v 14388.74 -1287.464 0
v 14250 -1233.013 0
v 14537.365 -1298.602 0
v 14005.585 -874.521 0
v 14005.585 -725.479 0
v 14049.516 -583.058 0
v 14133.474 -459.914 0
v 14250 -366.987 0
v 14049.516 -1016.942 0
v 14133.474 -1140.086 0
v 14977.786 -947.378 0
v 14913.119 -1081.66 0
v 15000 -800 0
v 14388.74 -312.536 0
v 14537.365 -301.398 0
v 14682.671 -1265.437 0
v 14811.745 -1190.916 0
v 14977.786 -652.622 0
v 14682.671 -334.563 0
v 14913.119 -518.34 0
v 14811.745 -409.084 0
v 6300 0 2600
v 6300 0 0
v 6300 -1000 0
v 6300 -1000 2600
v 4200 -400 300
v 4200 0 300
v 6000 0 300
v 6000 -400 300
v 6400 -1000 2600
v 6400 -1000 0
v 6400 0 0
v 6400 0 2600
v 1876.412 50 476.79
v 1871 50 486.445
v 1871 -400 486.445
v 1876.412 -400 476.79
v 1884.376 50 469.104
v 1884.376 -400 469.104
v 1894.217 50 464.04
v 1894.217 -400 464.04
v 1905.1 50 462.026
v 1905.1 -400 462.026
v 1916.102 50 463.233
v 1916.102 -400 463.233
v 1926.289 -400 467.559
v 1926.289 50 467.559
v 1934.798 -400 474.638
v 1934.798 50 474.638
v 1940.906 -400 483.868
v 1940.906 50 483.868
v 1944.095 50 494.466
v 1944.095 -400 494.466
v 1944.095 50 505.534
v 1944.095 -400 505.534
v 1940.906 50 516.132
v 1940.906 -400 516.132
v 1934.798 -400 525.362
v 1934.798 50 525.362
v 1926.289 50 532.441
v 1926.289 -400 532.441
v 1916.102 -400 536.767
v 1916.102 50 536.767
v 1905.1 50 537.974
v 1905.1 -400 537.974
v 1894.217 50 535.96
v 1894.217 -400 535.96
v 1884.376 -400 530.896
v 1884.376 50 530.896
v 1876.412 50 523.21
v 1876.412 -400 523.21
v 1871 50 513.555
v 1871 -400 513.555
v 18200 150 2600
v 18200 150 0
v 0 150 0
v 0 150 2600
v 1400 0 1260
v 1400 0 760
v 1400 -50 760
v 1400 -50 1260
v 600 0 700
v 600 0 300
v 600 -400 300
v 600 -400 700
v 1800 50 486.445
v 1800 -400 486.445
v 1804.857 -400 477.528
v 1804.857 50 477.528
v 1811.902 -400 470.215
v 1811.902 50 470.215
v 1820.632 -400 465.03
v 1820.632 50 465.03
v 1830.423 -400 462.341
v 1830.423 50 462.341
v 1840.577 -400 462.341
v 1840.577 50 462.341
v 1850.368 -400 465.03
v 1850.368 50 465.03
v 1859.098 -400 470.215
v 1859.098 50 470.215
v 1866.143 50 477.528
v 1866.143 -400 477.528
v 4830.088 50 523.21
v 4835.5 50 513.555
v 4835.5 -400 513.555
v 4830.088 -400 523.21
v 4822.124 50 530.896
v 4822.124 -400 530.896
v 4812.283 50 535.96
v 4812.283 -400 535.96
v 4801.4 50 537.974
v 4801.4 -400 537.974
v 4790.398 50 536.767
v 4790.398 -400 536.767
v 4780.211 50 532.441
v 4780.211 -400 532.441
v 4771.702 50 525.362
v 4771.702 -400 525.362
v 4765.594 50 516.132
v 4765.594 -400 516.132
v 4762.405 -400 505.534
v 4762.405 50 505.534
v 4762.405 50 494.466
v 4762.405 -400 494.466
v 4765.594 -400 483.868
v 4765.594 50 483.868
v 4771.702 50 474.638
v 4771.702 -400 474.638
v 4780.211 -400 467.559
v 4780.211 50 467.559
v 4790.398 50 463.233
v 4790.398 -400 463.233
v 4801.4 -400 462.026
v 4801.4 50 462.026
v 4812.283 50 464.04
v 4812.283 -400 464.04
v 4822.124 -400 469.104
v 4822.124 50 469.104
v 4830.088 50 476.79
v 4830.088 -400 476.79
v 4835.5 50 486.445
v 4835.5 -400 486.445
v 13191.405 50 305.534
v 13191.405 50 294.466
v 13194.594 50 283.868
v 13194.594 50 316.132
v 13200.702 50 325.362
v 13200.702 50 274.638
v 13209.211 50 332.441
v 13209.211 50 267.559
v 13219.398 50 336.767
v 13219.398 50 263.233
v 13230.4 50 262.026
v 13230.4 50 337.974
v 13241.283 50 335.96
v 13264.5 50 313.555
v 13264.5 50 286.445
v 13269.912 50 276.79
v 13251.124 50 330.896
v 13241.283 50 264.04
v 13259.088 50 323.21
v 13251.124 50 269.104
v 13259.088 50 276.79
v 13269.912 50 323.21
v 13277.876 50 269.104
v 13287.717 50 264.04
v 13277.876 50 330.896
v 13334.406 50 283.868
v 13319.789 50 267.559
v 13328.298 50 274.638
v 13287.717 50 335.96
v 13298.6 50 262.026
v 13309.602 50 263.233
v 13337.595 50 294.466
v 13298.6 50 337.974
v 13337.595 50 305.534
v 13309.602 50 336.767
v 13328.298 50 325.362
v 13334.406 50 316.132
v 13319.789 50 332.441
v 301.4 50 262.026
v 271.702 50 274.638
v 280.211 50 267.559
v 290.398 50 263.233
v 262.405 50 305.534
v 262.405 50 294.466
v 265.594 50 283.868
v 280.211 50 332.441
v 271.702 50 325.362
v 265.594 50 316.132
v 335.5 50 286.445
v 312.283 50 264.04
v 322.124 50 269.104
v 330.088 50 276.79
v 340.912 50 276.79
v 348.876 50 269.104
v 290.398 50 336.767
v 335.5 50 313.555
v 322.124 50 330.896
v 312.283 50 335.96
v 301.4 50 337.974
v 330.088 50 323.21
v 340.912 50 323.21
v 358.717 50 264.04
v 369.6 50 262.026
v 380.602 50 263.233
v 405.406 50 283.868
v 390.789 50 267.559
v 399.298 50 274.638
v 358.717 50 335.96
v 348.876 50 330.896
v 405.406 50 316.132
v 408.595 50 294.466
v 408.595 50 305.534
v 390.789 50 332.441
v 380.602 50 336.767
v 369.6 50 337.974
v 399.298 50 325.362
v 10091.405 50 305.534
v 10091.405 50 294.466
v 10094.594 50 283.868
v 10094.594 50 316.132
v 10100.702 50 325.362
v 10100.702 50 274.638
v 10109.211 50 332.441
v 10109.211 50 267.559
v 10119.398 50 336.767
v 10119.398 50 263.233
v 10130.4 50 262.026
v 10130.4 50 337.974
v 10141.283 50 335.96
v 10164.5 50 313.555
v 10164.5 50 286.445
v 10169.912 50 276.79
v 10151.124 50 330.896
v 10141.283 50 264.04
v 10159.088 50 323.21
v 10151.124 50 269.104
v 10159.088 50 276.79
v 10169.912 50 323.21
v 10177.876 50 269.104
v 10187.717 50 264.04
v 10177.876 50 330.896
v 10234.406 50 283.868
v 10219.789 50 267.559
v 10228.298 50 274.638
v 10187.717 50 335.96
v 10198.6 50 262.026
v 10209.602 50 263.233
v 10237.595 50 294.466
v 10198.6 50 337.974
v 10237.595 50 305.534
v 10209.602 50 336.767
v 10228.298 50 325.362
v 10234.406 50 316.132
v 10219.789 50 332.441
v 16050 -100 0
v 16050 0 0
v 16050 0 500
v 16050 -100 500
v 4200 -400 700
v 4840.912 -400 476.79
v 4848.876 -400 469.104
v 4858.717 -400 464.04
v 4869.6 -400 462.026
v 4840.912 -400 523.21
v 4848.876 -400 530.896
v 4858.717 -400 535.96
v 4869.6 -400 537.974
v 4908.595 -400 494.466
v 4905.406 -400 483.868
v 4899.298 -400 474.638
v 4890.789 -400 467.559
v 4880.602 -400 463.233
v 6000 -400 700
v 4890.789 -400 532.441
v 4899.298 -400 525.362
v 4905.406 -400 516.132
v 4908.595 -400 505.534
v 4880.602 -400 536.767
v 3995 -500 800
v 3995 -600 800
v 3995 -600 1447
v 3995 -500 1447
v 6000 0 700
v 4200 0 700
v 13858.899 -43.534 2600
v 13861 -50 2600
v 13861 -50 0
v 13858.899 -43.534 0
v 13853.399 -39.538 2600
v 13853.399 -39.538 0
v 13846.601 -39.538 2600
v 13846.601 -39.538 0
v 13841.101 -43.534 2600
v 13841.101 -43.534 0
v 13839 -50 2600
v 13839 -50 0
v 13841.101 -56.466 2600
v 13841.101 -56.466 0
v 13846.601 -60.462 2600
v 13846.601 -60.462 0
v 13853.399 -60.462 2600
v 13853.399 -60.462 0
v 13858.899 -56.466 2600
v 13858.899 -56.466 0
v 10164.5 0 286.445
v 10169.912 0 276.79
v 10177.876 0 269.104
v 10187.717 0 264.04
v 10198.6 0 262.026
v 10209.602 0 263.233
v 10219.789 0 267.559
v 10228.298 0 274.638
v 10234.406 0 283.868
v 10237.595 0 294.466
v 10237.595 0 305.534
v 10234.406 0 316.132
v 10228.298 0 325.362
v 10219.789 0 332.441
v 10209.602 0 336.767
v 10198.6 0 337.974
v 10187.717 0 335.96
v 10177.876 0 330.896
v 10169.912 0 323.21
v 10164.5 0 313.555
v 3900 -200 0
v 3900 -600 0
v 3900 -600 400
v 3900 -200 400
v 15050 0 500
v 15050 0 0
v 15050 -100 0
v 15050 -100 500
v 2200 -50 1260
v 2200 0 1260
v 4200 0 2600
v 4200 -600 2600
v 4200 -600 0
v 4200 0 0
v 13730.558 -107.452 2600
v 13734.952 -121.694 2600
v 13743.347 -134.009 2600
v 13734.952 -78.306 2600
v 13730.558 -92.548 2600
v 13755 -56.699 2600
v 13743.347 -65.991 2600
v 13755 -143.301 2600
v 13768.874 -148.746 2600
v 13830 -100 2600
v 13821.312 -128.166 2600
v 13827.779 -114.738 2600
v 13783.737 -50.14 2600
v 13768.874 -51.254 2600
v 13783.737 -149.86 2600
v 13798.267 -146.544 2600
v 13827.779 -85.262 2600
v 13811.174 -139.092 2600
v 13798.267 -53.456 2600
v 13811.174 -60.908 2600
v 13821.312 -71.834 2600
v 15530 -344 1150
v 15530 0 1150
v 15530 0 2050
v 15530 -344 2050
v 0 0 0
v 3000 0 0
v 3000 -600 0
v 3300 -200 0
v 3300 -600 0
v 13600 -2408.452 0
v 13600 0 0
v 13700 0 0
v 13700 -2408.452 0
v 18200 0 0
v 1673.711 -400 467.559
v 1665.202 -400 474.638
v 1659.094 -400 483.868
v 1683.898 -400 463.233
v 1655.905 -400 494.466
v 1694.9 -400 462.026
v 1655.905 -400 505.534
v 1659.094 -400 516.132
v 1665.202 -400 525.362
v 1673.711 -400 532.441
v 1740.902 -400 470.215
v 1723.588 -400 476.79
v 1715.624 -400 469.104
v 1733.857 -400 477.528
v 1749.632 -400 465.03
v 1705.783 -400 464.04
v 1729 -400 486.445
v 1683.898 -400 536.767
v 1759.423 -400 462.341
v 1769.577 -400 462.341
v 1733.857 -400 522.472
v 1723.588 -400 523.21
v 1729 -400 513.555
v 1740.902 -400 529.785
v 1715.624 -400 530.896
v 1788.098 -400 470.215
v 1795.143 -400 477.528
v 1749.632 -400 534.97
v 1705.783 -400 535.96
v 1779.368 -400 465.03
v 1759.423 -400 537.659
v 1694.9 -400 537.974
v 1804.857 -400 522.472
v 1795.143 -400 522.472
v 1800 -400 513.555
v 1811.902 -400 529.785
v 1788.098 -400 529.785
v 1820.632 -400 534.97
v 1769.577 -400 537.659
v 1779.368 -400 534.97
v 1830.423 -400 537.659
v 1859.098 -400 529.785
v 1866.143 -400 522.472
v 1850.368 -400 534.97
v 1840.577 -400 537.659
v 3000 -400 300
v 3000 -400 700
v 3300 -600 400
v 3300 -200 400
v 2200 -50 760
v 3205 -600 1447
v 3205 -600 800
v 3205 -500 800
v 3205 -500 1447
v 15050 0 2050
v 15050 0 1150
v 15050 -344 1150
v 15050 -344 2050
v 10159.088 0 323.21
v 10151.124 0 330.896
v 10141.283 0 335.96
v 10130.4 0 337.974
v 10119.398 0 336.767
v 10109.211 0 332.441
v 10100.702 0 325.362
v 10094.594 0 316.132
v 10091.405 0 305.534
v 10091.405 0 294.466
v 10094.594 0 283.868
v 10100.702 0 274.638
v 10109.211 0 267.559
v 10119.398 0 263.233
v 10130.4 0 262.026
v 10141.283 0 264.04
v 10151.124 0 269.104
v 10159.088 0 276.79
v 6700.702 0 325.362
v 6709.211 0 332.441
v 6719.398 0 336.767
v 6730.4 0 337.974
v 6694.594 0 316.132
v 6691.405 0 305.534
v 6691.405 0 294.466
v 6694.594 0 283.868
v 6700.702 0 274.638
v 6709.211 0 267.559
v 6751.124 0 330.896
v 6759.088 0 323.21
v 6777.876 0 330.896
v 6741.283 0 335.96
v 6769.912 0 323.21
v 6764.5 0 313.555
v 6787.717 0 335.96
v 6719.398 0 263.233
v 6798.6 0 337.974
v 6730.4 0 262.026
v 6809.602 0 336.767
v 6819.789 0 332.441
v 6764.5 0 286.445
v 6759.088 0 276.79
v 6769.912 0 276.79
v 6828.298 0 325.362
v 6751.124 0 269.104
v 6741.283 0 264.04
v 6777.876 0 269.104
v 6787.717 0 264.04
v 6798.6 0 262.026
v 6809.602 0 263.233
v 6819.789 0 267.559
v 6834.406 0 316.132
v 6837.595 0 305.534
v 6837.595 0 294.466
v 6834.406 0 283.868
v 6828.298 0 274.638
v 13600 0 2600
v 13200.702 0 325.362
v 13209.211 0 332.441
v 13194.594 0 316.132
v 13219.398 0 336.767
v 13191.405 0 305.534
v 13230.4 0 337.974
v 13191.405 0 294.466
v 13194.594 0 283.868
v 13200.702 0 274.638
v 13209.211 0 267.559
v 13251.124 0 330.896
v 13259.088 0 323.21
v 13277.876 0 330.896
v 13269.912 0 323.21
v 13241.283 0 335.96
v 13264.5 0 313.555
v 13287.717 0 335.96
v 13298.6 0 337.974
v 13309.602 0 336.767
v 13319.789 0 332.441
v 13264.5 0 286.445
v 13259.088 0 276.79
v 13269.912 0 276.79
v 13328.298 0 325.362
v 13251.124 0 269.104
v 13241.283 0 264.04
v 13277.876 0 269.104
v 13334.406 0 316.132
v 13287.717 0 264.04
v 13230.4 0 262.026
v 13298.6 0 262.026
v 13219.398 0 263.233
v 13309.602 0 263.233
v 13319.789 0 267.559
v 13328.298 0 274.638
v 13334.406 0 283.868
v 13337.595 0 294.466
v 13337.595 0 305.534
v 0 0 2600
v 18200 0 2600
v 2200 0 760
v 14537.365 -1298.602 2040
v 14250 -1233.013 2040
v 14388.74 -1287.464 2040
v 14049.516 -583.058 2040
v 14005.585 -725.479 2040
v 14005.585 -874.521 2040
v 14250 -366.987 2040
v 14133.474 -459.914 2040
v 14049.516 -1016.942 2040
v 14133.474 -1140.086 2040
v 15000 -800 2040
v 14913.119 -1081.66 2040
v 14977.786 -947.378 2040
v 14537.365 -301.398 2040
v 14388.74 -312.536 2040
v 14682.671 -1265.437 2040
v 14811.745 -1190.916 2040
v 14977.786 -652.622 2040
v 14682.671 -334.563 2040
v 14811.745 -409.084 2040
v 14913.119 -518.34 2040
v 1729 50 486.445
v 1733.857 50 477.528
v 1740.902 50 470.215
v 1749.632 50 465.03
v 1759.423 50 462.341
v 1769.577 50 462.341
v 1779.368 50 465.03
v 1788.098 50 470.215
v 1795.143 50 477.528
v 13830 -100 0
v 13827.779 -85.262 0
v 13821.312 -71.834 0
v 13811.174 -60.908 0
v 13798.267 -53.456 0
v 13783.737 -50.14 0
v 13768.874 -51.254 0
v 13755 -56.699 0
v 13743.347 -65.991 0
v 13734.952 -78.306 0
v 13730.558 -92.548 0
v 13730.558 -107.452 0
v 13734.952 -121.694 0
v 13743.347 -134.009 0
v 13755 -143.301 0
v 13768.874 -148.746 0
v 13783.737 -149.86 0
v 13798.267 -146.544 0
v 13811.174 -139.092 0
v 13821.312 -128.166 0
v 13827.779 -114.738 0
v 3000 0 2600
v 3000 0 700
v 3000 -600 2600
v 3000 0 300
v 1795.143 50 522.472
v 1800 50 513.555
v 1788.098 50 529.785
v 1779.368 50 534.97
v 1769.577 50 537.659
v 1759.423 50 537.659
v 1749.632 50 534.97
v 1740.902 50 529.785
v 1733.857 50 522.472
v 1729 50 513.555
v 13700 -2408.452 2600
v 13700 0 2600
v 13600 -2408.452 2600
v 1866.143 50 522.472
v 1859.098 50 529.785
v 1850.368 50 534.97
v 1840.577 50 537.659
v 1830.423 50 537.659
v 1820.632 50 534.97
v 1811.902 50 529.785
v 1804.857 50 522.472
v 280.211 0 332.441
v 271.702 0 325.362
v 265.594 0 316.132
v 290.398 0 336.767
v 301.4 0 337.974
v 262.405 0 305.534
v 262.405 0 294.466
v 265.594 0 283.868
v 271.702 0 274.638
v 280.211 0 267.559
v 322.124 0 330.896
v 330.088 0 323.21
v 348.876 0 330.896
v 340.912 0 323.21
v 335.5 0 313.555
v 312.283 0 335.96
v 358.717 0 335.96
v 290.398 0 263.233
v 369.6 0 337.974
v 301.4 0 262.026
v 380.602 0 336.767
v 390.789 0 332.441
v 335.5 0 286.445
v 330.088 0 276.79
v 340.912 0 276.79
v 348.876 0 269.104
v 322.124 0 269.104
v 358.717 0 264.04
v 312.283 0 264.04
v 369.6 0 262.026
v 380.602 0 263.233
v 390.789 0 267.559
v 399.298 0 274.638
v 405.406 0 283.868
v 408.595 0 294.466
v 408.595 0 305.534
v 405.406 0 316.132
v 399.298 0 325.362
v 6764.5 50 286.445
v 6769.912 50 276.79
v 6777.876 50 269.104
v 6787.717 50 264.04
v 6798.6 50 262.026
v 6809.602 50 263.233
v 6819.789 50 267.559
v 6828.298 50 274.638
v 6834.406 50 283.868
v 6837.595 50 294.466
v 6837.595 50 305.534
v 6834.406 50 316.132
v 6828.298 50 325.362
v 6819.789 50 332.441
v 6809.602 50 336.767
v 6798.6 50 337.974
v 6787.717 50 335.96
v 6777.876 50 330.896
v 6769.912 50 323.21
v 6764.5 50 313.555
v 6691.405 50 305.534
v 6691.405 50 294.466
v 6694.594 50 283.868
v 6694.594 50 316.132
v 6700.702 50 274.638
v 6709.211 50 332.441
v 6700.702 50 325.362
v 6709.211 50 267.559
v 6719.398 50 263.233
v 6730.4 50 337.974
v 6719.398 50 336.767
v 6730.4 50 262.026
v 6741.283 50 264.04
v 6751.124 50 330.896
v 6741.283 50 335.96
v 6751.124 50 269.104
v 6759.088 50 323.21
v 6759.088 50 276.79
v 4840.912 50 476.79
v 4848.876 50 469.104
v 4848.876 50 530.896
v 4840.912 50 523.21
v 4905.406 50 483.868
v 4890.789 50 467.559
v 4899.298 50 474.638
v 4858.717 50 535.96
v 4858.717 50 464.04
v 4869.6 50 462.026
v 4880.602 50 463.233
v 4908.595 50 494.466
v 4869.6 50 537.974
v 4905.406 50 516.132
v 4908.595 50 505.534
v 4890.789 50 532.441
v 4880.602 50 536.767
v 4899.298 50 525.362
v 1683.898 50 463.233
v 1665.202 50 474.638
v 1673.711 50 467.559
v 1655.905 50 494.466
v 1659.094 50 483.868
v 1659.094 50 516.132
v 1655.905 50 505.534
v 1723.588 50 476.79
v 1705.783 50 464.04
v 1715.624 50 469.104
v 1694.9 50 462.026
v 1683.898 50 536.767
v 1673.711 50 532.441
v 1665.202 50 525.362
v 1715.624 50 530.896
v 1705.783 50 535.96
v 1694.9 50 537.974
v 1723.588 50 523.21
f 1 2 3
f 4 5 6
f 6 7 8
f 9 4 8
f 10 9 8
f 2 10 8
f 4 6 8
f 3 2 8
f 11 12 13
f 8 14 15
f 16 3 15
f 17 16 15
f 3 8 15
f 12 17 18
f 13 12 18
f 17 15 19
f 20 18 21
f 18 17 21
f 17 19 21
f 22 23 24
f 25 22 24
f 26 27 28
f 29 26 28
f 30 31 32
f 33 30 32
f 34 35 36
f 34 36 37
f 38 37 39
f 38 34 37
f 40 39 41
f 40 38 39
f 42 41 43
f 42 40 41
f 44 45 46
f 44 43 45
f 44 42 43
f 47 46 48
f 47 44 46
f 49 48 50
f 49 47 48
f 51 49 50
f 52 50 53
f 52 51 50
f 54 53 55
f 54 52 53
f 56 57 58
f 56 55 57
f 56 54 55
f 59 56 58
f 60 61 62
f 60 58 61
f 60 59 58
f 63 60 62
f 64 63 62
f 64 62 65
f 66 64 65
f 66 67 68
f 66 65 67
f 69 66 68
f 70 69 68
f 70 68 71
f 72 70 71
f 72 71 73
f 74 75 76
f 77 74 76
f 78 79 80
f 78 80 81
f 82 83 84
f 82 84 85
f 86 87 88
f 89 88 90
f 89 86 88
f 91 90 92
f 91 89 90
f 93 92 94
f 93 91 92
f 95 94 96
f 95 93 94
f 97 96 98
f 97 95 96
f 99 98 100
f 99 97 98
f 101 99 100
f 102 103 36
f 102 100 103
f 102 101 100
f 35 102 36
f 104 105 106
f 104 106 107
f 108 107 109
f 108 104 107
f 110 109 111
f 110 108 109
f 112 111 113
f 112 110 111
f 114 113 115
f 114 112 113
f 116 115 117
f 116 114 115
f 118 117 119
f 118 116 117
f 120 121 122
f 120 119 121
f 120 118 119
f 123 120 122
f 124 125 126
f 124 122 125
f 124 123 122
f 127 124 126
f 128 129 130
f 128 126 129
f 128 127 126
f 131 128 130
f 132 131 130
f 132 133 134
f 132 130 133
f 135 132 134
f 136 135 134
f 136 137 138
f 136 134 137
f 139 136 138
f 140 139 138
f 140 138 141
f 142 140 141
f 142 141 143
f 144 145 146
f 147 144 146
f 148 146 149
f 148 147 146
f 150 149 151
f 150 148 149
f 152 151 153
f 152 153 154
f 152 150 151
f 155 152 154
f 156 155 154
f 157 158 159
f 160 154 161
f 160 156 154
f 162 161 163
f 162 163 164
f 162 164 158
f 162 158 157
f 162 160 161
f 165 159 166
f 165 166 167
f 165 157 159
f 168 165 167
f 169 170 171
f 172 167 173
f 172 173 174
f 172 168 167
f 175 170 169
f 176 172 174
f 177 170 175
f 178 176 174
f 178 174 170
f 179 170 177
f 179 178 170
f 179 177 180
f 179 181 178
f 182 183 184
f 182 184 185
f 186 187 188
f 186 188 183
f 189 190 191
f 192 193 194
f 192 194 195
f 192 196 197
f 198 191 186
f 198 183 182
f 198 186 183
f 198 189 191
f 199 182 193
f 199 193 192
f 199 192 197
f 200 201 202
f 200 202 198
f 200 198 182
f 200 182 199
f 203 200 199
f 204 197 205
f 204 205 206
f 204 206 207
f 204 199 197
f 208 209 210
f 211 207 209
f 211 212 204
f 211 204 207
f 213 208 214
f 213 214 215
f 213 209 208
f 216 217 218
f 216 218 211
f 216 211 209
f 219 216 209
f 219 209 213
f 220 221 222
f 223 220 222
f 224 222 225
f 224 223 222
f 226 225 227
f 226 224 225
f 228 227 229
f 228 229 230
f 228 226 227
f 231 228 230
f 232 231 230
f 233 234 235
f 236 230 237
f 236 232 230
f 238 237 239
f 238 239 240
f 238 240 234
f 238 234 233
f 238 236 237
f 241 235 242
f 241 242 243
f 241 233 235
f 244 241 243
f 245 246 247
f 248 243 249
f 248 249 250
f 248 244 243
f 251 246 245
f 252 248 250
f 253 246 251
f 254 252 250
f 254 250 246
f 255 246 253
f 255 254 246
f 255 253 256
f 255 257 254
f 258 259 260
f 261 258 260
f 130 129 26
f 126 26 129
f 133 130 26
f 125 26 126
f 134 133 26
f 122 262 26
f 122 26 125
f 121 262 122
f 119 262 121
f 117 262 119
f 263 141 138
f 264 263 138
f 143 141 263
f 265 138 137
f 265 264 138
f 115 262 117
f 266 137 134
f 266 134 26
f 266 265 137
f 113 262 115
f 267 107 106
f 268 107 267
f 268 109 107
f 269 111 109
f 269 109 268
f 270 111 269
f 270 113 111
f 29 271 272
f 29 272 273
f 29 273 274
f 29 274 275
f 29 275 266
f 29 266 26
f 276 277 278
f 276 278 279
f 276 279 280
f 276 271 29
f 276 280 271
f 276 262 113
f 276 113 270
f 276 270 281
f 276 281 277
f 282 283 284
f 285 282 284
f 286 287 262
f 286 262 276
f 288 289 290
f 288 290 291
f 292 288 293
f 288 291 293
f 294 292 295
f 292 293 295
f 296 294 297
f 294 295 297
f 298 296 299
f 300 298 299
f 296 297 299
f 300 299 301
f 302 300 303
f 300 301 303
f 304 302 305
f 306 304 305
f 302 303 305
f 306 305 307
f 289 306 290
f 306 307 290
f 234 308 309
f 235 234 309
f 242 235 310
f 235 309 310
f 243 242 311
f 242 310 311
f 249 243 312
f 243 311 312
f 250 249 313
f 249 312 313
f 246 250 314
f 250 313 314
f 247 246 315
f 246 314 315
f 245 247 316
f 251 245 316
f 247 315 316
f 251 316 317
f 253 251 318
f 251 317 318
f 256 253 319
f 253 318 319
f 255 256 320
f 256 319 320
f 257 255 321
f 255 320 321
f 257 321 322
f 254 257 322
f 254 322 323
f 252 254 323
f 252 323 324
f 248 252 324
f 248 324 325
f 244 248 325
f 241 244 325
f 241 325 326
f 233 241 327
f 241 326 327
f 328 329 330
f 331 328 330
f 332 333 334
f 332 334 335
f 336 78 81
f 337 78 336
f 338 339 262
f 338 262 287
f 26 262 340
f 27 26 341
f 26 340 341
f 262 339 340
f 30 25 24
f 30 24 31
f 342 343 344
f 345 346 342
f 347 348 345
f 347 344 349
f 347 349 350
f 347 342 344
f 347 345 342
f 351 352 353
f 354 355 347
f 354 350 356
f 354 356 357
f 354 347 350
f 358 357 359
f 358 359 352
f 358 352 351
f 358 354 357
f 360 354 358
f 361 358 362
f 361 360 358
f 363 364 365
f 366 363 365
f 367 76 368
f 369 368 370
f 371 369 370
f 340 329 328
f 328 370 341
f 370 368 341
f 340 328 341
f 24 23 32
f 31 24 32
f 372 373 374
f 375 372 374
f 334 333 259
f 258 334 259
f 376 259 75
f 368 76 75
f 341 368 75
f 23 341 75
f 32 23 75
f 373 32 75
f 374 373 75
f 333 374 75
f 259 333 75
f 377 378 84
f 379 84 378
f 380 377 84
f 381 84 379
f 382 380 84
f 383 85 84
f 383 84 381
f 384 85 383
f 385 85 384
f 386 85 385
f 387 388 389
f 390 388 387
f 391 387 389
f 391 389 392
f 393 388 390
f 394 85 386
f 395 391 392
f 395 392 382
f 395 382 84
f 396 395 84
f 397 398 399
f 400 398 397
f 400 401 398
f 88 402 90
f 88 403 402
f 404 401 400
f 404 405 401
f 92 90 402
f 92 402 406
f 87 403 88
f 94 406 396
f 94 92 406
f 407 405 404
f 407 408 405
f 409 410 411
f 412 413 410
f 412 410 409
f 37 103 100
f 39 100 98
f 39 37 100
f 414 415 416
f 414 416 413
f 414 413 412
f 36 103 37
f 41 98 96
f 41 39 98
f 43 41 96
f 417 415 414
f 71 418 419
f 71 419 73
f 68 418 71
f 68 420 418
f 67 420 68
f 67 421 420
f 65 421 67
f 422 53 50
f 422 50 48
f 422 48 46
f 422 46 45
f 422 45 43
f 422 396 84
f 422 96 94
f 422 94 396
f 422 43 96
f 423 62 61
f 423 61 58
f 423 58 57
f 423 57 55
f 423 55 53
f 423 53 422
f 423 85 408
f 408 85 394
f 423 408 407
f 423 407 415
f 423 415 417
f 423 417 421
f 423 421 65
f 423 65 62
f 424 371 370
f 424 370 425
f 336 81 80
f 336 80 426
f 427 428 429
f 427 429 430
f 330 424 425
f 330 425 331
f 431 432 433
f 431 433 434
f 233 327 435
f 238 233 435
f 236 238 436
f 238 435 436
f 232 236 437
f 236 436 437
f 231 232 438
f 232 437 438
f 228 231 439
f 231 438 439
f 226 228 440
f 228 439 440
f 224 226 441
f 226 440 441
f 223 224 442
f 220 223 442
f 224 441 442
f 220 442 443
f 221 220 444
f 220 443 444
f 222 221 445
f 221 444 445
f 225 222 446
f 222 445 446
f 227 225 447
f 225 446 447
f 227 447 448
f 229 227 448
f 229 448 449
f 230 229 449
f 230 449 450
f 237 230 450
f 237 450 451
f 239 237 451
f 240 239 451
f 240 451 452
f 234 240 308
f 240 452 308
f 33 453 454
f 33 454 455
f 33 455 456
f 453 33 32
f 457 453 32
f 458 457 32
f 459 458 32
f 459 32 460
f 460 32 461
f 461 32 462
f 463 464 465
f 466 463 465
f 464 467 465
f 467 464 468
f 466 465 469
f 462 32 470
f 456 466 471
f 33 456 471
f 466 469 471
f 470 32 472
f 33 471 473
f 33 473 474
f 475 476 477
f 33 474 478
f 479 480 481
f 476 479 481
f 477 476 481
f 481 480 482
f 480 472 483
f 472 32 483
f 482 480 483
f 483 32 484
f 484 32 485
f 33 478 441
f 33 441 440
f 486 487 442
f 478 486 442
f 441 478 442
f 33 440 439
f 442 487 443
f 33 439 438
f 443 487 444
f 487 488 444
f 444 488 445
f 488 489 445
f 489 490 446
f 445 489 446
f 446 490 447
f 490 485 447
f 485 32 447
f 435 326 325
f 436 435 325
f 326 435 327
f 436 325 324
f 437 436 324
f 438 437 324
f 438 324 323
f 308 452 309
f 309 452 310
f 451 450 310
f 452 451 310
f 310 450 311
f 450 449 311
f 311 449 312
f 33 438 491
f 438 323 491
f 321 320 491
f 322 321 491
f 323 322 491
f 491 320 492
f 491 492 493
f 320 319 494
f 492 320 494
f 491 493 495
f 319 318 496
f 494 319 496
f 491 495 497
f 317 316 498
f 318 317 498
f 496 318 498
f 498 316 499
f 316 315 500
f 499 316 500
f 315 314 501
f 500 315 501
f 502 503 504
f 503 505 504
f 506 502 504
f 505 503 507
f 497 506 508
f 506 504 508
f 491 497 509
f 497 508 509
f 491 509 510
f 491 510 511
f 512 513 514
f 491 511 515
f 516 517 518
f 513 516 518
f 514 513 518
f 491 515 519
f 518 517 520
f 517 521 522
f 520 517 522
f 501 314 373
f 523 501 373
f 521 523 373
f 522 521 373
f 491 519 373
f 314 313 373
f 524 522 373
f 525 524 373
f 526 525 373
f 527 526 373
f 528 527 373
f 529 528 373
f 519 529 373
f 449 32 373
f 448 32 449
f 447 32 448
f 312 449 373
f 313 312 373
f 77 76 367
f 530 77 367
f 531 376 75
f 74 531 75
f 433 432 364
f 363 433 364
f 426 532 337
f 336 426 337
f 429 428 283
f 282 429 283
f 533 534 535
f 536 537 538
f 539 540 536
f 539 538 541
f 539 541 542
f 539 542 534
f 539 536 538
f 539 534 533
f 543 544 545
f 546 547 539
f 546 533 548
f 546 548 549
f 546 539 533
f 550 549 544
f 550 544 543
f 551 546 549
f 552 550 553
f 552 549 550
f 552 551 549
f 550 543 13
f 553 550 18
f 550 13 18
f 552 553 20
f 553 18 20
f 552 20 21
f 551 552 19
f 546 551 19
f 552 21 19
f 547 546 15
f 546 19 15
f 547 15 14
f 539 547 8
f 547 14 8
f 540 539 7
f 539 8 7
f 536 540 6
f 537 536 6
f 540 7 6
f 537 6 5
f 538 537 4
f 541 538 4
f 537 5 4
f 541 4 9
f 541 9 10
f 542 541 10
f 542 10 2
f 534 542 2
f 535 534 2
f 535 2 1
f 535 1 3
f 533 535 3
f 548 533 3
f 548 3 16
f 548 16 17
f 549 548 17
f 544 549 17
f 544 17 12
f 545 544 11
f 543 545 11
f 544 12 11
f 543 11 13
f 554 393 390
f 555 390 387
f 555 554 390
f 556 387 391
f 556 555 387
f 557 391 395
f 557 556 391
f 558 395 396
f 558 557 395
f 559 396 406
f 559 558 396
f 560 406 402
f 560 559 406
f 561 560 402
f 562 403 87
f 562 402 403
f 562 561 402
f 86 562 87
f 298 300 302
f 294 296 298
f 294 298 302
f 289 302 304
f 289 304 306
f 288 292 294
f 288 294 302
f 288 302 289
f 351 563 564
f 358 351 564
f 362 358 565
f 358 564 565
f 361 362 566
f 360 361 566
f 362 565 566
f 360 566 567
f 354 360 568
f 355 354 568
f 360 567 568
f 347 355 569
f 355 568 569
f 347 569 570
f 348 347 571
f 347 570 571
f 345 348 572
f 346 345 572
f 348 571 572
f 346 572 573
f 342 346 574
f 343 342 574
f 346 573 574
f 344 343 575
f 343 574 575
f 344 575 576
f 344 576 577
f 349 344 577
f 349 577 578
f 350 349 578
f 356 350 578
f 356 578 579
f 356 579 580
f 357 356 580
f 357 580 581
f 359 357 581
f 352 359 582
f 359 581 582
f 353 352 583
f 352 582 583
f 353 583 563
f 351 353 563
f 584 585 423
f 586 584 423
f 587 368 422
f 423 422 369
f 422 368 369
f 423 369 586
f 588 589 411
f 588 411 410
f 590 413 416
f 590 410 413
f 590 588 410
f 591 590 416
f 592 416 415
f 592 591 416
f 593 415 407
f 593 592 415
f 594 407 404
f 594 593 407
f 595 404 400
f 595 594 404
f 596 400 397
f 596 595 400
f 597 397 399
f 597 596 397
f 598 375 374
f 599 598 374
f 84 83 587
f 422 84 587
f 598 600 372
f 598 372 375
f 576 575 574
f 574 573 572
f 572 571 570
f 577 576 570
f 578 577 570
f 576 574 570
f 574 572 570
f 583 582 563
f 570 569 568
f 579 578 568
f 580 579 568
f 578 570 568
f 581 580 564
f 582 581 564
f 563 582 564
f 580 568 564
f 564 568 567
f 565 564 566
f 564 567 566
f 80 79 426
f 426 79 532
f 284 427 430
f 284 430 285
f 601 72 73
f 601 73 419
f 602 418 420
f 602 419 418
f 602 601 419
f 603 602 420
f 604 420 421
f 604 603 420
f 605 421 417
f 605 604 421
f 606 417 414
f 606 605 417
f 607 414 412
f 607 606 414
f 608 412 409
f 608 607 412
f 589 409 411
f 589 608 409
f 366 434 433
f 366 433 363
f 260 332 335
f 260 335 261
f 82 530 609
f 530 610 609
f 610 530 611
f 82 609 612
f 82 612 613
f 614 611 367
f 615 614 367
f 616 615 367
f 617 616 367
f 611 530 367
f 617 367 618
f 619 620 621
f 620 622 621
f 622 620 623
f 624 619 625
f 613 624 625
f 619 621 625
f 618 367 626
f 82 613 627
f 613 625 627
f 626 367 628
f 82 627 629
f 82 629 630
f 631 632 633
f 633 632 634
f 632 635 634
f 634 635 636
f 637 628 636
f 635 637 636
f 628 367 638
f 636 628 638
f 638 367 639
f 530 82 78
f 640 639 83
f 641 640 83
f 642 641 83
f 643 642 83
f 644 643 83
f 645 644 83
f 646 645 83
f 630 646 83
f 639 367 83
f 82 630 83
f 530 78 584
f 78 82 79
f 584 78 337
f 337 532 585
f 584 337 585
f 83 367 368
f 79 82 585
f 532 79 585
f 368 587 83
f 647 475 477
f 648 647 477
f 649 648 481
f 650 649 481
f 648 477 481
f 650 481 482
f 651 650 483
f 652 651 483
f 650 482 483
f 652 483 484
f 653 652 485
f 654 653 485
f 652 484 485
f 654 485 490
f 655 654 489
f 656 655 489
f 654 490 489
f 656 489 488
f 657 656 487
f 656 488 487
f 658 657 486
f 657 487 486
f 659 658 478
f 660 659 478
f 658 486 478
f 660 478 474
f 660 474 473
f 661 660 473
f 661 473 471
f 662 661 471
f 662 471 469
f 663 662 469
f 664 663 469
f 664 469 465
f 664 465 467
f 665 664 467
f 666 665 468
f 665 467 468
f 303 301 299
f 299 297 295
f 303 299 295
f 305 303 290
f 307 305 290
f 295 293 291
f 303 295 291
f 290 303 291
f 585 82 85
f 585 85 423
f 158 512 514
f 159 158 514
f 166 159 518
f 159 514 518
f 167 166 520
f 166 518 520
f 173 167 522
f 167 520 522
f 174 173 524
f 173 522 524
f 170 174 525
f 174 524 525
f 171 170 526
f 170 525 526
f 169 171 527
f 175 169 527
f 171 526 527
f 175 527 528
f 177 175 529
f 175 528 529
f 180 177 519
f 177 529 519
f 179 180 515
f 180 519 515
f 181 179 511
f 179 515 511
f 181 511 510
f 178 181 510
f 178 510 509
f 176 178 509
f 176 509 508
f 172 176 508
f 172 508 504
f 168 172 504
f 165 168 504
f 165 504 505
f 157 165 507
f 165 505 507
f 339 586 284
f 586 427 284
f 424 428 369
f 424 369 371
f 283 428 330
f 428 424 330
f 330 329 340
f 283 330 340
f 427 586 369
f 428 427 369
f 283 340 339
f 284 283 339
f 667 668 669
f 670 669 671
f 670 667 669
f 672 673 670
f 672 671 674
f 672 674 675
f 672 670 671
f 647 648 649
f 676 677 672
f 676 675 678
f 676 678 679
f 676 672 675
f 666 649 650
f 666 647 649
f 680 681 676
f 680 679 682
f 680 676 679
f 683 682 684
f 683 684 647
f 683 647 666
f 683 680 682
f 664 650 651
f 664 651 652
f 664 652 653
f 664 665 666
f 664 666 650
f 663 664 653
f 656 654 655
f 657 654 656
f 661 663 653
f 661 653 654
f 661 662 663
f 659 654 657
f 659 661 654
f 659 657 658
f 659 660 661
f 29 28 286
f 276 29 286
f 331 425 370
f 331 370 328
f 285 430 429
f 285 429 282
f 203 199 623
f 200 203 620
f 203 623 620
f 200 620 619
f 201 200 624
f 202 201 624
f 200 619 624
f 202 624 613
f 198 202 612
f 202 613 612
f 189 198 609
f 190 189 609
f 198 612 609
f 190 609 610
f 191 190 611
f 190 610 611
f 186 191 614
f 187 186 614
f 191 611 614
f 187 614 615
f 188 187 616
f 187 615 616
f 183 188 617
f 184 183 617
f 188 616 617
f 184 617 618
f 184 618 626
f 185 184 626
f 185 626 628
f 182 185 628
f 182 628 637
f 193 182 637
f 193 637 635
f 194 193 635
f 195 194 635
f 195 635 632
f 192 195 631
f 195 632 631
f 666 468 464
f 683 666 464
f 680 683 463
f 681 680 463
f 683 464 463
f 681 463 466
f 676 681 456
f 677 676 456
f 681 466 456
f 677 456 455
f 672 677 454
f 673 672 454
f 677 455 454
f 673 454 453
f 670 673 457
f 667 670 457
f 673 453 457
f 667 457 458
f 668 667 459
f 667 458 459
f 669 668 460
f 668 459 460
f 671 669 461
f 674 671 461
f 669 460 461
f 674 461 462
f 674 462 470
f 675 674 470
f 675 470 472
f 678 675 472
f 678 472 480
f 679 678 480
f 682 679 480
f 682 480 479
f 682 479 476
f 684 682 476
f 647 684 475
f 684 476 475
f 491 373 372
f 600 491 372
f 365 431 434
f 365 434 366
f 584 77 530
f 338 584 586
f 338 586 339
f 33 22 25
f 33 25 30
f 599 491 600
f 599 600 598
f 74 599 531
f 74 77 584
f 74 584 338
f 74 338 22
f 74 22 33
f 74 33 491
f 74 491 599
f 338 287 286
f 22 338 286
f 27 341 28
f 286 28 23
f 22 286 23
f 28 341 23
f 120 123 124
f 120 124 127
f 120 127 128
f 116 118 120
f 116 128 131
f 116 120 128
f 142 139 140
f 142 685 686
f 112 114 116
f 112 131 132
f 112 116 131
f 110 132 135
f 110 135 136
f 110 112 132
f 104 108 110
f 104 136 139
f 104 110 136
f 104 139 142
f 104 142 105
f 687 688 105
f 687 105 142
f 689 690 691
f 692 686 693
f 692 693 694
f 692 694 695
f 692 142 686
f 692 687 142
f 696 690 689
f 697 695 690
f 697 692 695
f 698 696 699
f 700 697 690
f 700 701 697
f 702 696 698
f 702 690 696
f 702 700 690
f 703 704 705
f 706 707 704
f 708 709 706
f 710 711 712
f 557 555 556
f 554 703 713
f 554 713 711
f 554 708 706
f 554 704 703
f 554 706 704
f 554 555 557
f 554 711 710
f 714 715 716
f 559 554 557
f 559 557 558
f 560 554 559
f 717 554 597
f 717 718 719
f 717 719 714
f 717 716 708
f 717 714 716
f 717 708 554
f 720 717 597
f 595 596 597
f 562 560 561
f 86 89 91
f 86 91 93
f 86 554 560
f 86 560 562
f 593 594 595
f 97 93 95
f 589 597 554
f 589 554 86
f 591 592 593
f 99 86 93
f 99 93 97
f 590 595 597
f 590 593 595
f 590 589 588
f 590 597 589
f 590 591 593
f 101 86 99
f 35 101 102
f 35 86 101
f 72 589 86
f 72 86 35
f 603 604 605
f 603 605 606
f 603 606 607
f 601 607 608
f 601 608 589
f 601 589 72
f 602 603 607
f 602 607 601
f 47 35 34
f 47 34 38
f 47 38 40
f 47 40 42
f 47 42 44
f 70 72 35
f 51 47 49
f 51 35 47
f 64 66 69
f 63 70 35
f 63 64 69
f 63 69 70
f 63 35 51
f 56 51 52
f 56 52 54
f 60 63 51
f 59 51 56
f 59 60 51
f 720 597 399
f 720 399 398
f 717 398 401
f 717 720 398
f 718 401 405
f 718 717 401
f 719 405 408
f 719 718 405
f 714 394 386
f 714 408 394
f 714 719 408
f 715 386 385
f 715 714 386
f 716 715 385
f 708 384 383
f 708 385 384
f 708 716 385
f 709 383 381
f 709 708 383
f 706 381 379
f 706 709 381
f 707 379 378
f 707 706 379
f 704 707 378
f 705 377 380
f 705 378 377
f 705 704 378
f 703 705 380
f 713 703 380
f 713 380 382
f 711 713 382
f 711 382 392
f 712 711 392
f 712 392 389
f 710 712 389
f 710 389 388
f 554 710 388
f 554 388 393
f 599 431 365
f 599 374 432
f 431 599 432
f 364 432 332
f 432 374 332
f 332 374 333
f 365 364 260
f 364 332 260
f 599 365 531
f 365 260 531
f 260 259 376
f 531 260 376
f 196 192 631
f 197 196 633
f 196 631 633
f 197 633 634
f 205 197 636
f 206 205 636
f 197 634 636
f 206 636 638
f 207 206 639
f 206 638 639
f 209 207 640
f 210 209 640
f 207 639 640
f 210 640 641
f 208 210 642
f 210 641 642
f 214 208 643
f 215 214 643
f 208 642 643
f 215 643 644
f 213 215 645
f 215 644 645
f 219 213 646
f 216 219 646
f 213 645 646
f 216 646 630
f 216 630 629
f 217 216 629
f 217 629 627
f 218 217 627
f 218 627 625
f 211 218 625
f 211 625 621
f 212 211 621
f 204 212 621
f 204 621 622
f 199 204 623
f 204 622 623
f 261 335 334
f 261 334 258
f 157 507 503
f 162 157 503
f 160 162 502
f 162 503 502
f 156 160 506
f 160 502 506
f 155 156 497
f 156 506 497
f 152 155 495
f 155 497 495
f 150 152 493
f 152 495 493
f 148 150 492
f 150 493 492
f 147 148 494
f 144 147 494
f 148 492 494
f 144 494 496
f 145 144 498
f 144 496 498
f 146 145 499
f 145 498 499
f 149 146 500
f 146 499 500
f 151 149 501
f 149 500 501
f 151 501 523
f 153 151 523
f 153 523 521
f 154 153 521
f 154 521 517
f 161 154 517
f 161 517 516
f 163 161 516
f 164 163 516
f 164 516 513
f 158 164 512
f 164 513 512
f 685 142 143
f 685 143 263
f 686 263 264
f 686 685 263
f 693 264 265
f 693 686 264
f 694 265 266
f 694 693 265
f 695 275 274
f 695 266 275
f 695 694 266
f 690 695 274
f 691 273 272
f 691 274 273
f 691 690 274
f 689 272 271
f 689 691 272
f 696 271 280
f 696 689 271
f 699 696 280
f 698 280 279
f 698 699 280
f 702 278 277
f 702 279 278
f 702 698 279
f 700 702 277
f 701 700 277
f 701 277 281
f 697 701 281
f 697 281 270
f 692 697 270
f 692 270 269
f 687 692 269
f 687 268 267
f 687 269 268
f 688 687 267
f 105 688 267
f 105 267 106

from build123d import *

# Parameters (mm, degrees)
F1_DEPTH      = 2600
F0_R          = 50
F0_R_2        = 11
F2_W          = 790
F2_H          = 647
F3_DEPTH      = 100
F4_W          = 2400
F4_H          = 400
F4_W_2        = 1800
F5_DEPTH      = 400
F6_W          = 800
F6_H          = 500
F7_DEPTH      = 50
F9_DEPTH      = 50
F9_DEPTH_BACK = 600
F0_R_3        = 500
F10_DEPTH     = 2040
F11_W         = 1000
F11_H         = 500
F12_DEPTH     = 100
F13_W         = 600
F13_H         = 400
F14_DEPTH     = 400
F15_W         = 480
F15_H         = 900
F16_DEPTH     = 344


with BuildPart() as f1:
    # F0 (on Top) → F1 (new body)
    with BuildSketch(Plane.XY):
        Polygon((0, 150), (0, 0), (3000, 0), (3000, -600), (4200, -600), (4200, 0), (6300, 0), (6300, -1000), (6400, -1000), (6400, 0), (13600, 0), (13600, -2408.4522724152), (13700, -2408.4522724152), (13700, 0), (18200, 0), (18200, 150), align=None)
    extrude(amount=F1_DEPTH)

    # F2 (on face) → F3 (cut)
    with BuildSketch(Plane.XZ.offset(600)):
        with Locations((3600, 1123.5)):
            Rectangle(F2_W, F2_H)
    extrude(amount=-F3_DEPTH, mode=Mode.SUBTRACT)

    # F4 (on face) → F5 (join)
    with BuildSketch(Plane.XZ):
        with Locations((1800, 500)):
            Rectangle(F4_W, F4_H)
        with Locations((5100, 500)):
            Rectangle(F4_W_2, F4_H)
    extrude(amount=F5_DEPTH)

    # F6 (on face) → F7 (join)
    with BuildSketch(Plane.XZ):
        with Locations((1800, 1010)):
            Rectangle(F6_W, F6_H)
    extrude(amount=F7_DEPTH)

    # F8 (on face) → F9 (cut, two sides)
    with BuildSketch(Plane.XZ) as f9_sk:
        with BuildLine():
            ThreePointArc((13264.5, 313.5554417117), (13191, 300), (13264.5, 286.4445582883))
            ThreePointArc((13264.5, 286.4445582883), (13338, 300), (13264.5, 313.5554417117))
        make_face()
        with BuildLine():
            ThreePointArc((10164.5, 313.5554417117), (10091, 300), (10164.5, 286.4445582883))
            ThreePointArc((10164.5, 286.4445582883), (10238, 300), (10164.5, 313.5554417117))
        make_face()
        with BuildLine():
            ThreePointArc((6764.5, 313.5554417117), (6691, 300), (6764.5, 286.4445582883))
            ThreePointArc((6764.5, 286.4445582883), (6838, 300), (6764.5, 313.5554417117))
        make_face()
        with BuildLine():
            ThreePointArc((4835.5, 513.5554417117), (4762, 500), (4835.5, 486.4445582883))
            ThreePointArc((4835.5, 486.4445582883), (4909, 500), (4835.5, 513.5554417117))
        make_face()
        with BuildLine():
            ThreePointArc((335.5, 313.5554417117), (262, 300), (335.5, 286.4445582883))
            ThreePointArc((335.5, 286.4445582883), (409, 300), (335.5, 313.5554417117))
        make_face()
        with BuildLine():
            ThreePointArc((1800, 486.4445582883), (1835.5, 462), (1871, 486.4445582883))
            ThreePointArc((1871, 486.4445582883), (1944.5, 500), (1871, 513.5554417117))
            ThreePointArc((1871, 513.5554417117), (1835.5, 538), (1800, 513.5554417117))
            ThreePointArc((1800, 513.5554417117), (1764.5, 538), (1729, 513.5554417117))
            ThreePointArc((1729, 513.5554417117), (1655.5, 500), (1729, 486.4445582883))
            ThreePointArc((1729, 486.4445582883), (1764.5, 462), (1800, 486.4445582883))
        make_face()
    extrude(amount=-F9_DEPTH, mode=Mode.SUBTRACT)
    extrude(f9_sk.sketch, amount=F9_DEPTH_BACK, mode=Mode.SUBTRACT)

    # F11 (on face) → F12 (join)
    with BuildSketch(Plane.XZ):
        with Locations((15550, 250)):
            Rectangle(F11_W, F11_H)
    extrude(amount=F12_DEPTH)

    # F13 (on face) → F14 (cut)
    with BuildSketch(Plane.XZ.offset(600)):
        with Locations((3600, 200)):
            Rectangle(F13_W, F13_H)
    extrude(amount=-F14_DEPTH, mode=Mode.SUBTRACT)

    # F15 (on face) → F16 (join)
    with BuildSketch(Plane.XZ):
        with Locations((15290, 1600)):
            Rectangle(F15_W, F15_H)
    extrude(amount=F16_DEPTH)


with BuildPart() as f1b:
    # F0 (on Top) → F1, piece 2 (new body)
    with BuildSketch(Plane.XY):
        with Locations((13780, -100)):
            Circle(F0_R)
    extrude(amount=F1_DEPTH)


with BuildPart() as f1c:
    # F0 (on Top) → F1, piece 3 (new body)
    with BuildSketch(Plane.XY):
        with Locations((13850, -50)):
            Circle(F0_R_2)
    extrude(amount=F1_DEPTH)


with BuildPart() as f10:
    # F0 (on Top) → F10 (new body)
    with BuildSketch(Plane.XY):
        with Locations((14500, -800)):
            Circle(F0_R_3)
    extrude(amount=F10_DEPTH)


solid = Compound([f1.part, f1b.part, f1c.part, f10.part])
